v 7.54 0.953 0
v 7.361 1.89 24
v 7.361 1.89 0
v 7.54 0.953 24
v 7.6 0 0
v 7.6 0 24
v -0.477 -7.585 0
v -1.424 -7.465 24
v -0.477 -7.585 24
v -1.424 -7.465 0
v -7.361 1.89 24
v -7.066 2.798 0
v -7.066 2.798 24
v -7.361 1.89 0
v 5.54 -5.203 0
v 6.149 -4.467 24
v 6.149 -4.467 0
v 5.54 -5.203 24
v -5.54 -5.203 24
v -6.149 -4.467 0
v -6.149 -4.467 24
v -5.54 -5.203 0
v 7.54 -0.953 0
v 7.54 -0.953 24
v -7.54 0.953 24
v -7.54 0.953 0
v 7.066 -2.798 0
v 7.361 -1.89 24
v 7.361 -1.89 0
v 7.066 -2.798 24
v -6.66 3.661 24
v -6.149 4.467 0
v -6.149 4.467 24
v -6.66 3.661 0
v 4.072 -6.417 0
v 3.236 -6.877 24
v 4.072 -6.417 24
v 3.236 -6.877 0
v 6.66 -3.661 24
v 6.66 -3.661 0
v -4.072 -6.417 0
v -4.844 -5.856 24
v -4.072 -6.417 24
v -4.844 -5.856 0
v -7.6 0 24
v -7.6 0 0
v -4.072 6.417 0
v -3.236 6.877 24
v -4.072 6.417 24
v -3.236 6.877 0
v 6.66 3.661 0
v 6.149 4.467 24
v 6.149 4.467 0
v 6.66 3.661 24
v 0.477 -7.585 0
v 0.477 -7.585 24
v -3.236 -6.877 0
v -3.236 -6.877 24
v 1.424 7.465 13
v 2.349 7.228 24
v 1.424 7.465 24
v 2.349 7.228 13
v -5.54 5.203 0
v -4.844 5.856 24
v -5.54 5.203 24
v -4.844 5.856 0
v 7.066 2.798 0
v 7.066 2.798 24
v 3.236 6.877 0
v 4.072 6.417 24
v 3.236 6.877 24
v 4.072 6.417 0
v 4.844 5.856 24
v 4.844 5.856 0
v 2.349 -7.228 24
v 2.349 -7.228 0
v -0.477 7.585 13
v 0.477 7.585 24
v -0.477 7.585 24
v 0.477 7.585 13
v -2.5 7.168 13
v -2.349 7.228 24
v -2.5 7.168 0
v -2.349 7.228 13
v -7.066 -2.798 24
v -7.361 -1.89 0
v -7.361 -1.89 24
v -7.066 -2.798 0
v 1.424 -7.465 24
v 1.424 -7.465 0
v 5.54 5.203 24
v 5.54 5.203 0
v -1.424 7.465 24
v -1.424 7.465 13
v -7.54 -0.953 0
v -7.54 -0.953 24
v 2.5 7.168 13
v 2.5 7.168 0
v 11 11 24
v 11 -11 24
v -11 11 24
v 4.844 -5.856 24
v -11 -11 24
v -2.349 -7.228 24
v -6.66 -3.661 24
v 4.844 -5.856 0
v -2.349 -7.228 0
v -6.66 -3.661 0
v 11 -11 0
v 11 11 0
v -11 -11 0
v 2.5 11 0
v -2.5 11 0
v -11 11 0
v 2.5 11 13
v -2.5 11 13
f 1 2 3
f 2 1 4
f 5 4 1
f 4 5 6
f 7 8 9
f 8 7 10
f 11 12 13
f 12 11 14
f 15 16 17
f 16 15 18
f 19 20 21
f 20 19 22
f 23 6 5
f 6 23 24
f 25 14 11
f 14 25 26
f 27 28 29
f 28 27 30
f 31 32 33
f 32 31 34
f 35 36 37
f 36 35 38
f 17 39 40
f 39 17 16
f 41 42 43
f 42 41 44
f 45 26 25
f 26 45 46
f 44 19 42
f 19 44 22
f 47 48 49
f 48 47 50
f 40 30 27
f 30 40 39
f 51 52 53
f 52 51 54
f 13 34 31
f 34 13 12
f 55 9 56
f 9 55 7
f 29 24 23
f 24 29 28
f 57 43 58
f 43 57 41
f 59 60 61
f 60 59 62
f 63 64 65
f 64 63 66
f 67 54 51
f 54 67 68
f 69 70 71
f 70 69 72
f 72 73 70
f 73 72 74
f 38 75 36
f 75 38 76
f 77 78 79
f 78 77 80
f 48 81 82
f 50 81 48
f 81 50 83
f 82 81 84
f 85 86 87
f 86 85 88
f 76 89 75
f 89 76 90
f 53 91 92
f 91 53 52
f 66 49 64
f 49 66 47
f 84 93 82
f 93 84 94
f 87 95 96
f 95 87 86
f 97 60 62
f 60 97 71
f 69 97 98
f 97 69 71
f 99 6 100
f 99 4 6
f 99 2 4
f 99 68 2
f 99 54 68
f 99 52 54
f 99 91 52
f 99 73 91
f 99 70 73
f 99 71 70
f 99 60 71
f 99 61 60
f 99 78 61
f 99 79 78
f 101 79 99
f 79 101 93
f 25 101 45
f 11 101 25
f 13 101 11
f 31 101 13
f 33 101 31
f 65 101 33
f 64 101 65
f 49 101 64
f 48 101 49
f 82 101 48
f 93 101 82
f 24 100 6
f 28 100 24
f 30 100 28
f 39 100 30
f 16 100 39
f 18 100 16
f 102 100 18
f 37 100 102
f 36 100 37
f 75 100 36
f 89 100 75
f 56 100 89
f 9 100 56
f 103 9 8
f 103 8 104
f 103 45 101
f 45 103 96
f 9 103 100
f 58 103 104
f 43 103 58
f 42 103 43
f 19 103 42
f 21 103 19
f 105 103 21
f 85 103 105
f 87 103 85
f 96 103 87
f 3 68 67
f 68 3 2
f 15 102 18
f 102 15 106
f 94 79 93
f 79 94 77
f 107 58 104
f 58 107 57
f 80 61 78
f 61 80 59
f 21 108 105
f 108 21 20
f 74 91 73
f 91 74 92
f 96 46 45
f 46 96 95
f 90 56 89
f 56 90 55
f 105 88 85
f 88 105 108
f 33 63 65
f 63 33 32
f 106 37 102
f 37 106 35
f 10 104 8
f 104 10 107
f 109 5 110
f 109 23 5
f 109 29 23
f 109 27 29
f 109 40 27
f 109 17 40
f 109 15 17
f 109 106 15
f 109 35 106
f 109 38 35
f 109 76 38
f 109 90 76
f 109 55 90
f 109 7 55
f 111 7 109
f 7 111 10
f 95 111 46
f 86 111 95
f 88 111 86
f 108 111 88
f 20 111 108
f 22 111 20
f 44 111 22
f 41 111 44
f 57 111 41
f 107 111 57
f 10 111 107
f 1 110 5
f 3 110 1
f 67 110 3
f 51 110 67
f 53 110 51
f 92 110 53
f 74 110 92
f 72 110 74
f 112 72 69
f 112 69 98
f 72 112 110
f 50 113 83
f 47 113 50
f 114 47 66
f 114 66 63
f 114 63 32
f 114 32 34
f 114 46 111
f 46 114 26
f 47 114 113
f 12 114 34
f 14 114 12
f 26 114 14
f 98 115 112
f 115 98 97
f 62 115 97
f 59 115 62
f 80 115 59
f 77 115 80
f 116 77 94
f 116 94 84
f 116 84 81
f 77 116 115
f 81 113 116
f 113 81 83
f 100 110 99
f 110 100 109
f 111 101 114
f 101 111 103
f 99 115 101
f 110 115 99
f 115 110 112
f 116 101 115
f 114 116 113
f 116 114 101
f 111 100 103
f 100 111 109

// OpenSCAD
// file: rails.scad
// Rail and Bearing

linear_rail_negative_add = 0.2;
linear_rail_diameter = 8;
linear_rail_length = 506;
module rail() {
    color([1/2,1/2,1/2])
        cylinder(d = linear_rail_diameter, h = linear_rail_length, $fn=25);
}

module rail_negative() {
    color([1/2,1/2,1/2])
        cylinder(d = linear_rail_diameter+linear_rail_negative_add, h = linear_rail_length, $fn=25);
}

bearing_height = 24;
bearing_outer_diameter = 15;
bearing_inner_diameter = 8;
module bearing() {
    color([1/2,1/2,1/2])
    difference() {
        cylinder(h = bearing_height, d = bearing_outer_diameter, $fn=25);
        translate([0,0,-1])
            cylinder(h = bearing_height+2, d = bearing_inner_diameter, $fn=25);
    }
}

module bearing_negative() {
    cylinder(h = bearing_height, d = bearing_outer_diameter + linear_rail_negative_add, $fn=50);
    
    ejection_slot_overhang_z = 5;
    ejection_slot_width_x = 5;
    ejection_slot_width_z = bearing_height/4*3;
    translate([0,50,ejection_slot_width_z/2 - ejection_slot_overhang_z])
        cube([ejection_slot_width_x,100,ejection_slot_width_z], center=true);
}

//bearing_negative();
// main file
include <rails.scad>

difference() {
    translate([0,0,bearing_height/2])
        cube([22, 22, bearing_height], center=true);
    bearing_negative();
}
